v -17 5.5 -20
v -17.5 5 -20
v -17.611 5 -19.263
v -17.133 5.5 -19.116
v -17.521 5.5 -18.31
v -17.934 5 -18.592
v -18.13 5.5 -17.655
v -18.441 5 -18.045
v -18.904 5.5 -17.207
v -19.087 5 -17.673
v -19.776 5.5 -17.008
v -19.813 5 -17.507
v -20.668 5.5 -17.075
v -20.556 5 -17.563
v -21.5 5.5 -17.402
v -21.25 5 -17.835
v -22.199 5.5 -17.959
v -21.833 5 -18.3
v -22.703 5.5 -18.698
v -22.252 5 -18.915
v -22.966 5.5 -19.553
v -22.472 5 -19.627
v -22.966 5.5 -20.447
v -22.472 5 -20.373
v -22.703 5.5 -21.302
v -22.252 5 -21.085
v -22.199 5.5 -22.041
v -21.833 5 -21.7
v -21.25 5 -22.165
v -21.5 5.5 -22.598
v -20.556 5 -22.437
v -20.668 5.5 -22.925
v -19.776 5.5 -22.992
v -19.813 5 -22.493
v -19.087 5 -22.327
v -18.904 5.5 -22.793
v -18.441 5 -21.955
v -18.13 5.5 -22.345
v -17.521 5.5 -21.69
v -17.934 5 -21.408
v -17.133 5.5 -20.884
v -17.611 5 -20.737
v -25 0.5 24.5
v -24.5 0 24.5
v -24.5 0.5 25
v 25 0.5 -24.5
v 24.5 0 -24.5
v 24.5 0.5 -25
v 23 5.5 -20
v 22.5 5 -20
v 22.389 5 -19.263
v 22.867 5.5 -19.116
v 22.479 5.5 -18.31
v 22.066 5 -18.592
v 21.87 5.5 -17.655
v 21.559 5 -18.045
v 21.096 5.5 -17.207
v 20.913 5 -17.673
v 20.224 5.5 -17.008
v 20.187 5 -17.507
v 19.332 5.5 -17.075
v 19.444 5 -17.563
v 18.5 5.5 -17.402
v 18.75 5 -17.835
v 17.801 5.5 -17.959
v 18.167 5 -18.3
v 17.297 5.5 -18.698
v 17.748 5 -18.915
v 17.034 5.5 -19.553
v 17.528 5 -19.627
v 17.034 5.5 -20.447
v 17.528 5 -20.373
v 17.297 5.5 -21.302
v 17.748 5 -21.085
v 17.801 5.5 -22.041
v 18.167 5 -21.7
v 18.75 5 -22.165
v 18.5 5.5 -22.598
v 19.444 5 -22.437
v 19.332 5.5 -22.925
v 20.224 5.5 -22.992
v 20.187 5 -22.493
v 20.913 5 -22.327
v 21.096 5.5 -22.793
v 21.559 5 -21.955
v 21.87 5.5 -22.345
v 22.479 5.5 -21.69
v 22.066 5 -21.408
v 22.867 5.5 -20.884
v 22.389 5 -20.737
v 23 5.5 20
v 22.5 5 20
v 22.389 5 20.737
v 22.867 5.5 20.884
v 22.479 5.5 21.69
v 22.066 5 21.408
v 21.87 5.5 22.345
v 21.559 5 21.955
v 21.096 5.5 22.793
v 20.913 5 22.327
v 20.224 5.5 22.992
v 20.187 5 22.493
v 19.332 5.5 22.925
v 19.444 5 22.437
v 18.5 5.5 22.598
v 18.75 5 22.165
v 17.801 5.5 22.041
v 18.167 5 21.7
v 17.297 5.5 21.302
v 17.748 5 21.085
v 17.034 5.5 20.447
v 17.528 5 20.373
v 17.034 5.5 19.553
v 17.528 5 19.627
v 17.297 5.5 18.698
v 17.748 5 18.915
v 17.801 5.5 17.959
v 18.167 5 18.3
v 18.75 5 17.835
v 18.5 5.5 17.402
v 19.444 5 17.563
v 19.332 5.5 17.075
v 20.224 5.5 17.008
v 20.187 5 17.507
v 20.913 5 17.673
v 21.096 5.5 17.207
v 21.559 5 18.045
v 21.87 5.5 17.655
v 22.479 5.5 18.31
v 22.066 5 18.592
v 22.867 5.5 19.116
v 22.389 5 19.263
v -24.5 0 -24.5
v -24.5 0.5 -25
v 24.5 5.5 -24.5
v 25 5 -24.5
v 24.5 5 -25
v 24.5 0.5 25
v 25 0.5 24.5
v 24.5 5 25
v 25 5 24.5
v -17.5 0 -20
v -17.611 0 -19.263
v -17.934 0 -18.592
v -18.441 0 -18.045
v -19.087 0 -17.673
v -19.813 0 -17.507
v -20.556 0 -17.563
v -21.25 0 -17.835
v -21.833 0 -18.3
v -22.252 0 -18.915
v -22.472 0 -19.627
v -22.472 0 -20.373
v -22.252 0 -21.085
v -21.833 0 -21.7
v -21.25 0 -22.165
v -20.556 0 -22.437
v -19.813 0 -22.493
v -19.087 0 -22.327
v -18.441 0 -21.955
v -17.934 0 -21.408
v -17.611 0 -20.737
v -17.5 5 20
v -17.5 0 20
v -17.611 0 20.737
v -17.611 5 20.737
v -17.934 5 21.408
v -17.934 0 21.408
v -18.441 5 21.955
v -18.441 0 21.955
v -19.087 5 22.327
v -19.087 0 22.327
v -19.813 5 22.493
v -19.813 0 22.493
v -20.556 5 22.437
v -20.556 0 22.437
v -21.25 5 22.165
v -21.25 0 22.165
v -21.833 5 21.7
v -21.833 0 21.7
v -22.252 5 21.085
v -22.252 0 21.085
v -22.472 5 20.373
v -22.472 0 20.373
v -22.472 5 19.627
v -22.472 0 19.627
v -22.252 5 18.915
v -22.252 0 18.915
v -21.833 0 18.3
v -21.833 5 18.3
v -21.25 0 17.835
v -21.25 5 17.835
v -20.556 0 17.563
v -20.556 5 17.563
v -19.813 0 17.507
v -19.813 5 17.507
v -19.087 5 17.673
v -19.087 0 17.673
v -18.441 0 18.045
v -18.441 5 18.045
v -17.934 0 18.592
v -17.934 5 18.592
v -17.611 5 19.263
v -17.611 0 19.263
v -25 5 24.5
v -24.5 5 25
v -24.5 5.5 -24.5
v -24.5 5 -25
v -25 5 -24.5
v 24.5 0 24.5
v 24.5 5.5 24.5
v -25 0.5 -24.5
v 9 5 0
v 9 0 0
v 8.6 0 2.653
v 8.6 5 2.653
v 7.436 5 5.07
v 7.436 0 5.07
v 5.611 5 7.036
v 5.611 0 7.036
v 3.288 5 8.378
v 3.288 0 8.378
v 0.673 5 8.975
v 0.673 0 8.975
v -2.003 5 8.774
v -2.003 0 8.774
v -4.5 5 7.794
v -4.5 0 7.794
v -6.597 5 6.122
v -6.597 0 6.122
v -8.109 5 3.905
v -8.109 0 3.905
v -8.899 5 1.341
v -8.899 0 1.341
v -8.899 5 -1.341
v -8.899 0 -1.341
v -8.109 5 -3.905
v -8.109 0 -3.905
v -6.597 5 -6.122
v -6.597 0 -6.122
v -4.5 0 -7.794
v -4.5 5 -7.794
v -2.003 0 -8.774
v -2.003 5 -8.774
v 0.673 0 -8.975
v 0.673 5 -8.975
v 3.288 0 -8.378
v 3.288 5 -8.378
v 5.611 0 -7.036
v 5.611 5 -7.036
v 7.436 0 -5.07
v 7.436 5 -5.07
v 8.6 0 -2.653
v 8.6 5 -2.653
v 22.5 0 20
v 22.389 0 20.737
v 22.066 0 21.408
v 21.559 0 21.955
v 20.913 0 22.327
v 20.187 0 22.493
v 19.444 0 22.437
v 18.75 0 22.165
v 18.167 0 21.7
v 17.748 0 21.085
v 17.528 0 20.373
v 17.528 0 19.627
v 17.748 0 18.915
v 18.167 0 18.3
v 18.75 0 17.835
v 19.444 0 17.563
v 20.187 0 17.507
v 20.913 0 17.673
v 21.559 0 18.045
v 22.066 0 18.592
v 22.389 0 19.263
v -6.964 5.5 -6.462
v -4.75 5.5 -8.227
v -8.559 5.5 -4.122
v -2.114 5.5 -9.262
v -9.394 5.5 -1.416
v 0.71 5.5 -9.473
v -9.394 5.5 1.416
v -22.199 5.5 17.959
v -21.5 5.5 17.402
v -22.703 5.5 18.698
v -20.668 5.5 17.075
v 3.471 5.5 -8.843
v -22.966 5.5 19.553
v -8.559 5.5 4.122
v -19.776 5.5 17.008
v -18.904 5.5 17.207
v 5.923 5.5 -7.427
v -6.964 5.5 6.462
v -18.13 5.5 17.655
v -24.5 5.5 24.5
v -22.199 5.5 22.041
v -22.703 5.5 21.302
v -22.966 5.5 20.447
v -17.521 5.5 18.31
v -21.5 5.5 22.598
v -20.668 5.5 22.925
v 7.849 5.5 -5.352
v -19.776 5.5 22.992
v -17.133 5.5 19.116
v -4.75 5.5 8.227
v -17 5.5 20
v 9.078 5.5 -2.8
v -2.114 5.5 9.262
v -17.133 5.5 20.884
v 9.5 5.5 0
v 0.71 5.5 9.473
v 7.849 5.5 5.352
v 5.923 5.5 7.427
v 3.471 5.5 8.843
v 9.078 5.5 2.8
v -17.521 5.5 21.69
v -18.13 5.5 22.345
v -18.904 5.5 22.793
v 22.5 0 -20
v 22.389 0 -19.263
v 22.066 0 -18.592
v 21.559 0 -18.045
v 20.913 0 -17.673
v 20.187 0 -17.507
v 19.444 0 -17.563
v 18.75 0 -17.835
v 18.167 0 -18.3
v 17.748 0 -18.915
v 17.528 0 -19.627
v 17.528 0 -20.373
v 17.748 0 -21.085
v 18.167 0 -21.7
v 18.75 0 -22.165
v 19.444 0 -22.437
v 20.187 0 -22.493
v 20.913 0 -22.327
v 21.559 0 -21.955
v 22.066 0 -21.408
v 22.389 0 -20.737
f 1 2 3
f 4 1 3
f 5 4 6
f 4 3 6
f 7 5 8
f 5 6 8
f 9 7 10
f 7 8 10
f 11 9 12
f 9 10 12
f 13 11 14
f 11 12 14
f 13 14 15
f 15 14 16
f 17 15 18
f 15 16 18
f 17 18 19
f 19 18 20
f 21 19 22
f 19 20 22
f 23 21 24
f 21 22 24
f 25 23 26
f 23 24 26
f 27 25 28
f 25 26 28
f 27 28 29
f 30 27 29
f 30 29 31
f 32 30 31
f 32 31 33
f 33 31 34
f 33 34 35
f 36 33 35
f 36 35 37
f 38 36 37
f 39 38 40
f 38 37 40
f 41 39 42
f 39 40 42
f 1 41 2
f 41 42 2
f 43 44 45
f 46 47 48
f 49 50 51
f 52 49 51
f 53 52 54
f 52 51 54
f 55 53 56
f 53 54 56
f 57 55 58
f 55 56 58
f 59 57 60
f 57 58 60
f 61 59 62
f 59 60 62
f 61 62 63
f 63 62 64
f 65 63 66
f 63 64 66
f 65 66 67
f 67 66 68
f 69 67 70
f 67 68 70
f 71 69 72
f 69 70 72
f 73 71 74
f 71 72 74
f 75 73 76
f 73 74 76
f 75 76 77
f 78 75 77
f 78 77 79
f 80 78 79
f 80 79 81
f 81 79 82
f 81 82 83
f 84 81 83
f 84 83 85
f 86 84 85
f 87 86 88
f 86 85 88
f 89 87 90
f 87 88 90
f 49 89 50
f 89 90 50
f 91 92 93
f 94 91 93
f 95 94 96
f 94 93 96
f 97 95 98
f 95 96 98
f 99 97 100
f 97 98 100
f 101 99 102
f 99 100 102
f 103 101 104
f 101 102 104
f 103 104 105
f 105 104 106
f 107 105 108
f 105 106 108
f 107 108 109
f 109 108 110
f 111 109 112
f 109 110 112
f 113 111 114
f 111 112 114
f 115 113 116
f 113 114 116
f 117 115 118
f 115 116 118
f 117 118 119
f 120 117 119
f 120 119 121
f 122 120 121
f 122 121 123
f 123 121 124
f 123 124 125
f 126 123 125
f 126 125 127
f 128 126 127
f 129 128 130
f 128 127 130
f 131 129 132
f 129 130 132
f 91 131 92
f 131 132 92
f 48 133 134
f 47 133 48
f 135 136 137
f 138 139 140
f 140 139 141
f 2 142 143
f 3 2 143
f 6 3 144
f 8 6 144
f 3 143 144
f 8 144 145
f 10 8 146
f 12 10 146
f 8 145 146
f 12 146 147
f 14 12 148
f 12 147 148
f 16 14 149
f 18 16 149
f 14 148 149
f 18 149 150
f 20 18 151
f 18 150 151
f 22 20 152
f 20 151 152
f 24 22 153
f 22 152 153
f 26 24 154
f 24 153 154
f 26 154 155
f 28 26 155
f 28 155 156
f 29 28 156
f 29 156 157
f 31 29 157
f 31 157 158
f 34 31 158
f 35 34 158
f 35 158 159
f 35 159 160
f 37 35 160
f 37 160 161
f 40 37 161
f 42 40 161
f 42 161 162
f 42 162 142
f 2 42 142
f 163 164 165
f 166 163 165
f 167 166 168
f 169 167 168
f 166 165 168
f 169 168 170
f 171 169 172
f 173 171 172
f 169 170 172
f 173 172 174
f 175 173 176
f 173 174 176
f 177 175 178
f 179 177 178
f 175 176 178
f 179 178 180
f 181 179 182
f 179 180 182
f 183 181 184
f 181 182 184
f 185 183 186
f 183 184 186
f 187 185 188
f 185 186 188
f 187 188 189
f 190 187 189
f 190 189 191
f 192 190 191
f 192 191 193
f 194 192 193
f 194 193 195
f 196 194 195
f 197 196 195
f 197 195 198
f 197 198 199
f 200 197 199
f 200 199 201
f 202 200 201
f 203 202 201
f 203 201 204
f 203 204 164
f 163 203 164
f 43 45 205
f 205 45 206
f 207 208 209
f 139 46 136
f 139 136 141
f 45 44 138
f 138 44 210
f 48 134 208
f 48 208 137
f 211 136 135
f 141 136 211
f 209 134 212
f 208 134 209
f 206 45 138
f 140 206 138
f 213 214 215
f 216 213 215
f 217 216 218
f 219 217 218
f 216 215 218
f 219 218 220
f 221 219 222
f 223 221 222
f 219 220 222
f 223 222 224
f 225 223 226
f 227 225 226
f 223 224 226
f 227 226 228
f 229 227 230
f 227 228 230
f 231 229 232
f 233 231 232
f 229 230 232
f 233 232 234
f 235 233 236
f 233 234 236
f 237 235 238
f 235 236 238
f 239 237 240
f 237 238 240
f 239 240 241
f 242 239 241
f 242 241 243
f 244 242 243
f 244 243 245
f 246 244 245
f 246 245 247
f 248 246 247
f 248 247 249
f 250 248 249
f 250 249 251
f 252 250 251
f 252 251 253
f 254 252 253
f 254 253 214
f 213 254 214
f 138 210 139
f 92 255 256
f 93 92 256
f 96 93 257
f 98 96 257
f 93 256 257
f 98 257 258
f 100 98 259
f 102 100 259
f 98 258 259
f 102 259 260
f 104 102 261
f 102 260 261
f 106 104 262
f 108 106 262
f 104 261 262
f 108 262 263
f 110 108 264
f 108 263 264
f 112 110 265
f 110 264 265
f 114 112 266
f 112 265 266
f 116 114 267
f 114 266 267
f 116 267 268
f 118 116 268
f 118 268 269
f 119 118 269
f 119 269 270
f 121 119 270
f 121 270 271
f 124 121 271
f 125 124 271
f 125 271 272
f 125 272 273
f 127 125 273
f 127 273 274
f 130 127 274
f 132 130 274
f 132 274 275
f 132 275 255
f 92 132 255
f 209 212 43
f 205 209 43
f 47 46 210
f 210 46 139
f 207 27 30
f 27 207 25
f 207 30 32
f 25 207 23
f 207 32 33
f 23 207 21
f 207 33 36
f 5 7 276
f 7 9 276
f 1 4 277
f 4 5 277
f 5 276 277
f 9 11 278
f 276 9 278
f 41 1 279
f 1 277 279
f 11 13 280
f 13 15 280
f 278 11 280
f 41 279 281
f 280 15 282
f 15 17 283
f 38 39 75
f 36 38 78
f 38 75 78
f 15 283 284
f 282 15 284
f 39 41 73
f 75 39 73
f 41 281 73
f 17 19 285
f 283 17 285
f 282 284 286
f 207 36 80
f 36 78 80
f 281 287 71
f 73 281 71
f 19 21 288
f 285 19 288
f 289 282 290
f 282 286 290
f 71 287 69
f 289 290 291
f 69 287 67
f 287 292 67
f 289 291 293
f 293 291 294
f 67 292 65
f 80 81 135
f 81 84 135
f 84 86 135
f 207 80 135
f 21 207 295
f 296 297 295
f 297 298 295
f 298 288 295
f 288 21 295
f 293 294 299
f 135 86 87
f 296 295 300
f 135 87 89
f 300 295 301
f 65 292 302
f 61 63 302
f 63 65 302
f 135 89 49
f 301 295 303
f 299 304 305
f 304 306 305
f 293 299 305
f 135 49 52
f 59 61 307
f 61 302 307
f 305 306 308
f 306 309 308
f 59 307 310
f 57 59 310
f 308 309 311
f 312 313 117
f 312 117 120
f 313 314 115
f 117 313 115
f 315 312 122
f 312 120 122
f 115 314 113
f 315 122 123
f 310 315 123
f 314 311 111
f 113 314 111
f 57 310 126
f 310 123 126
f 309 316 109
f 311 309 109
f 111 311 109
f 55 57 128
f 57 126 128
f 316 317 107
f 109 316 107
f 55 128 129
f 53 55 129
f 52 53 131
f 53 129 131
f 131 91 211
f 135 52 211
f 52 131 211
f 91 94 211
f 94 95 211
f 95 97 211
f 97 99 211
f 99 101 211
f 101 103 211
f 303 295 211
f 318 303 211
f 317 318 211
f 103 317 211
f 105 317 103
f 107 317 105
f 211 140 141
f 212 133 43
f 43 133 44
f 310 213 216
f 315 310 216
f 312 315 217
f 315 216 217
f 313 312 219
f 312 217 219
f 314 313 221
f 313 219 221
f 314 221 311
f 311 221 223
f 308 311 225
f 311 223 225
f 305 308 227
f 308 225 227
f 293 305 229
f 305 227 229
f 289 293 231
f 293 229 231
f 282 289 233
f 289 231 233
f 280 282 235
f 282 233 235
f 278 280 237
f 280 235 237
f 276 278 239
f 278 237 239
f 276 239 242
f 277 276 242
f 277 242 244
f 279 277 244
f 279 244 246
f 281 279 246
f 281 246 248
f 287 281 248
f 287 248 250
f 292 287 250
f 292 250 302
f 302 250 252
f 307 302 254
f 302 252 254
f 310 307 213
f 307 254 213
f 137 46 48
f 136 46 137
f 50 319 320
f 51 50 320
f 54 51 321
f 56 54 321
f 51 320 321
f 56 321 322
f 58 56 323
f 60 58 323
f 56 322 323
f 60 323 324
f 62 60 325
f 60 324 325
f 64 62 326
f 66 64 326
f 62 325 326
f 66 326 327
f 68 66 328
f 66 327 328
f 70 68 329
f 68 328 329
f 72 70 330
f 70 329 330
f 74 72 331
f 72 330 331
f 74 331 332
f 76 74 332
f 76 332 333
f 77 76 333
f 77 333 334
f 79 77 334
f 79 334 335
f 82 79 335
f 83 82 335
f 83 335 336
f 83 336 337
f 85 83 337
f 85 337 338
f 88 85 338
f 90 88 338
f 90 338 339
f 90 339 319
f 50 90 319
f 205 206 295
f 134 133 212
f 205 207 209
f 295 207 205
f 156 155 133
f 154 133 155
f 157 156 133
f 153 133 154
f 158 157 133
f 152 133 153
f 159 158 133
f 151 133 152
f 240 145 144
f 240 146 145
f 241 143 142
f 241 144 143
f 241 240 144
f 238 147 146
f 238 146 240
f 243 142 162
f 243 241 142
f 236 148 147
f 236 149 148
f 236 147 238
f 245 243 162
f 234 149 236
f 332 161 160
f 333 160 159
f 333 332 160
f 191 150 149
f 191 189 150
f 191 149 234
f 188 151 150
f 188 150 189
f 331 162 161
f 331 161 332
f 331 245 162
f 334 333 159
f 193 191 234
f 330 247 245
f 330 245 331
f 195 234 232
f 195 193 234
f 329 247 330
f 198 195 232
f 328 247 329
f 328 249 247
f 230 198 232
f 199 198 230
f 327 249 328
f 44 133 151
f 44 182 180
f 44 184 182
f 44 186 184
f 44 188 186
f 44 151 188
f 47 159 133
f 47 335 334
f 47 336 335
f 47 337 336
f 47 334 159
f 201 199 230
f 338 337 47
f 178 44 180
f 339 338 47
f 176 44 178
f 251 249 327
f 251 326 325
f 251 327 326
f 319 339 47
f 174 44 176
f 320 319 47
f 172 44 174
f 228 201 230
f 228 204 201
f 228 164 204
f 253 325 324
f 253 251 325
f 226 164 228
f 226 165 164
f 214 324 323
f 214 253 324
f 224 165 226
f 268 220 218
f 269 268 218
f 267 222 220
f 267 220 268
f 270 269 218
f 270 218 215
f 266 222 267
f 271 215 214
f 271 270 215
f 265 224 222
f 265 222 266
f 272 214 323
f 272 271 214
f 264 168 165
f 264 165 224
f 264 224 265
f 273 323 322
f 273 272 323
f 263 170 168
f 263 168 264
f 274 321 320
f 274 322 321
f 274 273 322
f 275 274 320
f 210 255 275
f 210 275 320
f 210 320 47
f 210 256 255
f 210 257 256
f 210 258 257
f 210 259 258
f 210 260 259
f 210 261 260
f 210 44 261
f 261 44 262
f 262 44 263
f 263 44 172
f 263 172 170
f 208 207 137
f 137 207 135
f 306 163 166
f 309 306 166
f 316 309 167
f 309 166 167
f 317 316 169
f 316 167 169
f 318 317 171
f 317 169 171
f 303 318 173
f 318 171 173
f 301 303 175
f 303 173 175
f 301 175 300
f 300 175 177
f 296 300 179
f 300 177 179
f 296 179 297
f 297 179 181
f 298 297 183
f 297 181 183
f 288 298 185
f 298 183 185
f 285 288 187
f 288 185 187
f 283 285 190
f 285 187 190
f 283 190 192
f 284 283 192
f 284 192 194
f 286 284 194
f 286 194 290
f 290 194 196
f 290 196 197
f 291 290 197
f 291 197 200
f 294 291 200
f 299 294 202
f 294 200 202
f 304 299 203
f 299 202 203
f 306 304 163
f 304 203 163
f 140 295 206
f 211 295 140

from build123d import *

# Parameters (mm, degrees)
F0_W     = 50
F0_H     = 50
F1_DEPTH = 5.5
F2_R     = 9
F3_DEPTH = 25
F4_R     = 2.5
F5_DEPTH = 25
F6_SIZE  = 0.5


with BuildPart() as f1:
    # F0 (on Front) → F1 (new body)
    with BuildSketch(Plane.XZ):
        Rectangle(F0_W, F0_H)
    extrude(amount=-F1_DEPTH)

    # F2 (on face) → F3 (cut)
    with BuildSketch(Plane.XZ):
        Circle(F2_R)
    extrude(amount=-F3_DEPTH, mode=Mode.SUBTRACT)

    # F4 (on face) → F5 (cut)
    with BuildSketch(Plane.XZ):
        with Locations((-20, -20)):
            Circle(F4_R)
        with Locations((20, -20)):
            Circle(F4_R)
        with Locations((-20, 20)):
            Circle(F4_R)
        with Locations((20, 20)):
            Circle(F4_R)
    extrude(amount=-F5_DEPTH, mode=Mode.SUBTRACT)

    # F6
    f6_edges = [f1.edges().sort_by_distance(p)[0] for p in [
        (0, 0, -25),
        (-25, 0, 0),
        (0, 0, 25),
        (25, 0, 0),
        (25, 2.75, -25),
        (-25, 2.75, -25),
        (-25, 2.75, 25),
        (25, 2.75, 25),
        (0, 5.5, 25),
        (25, 5.5, 0),
        (0, 5.5, -25),
        (-25, 5.5, 0),
        (-22.5, 5.5, -20),
        (17.5, 5.5, -20),
        (-22.5, 5.5, 20),
        (-9, 5.5, 0),
        (17.5, 5.5, 20),
    ]]
    chamfer(f6_edges, length=F6_SIZE)


solid = f1.part
